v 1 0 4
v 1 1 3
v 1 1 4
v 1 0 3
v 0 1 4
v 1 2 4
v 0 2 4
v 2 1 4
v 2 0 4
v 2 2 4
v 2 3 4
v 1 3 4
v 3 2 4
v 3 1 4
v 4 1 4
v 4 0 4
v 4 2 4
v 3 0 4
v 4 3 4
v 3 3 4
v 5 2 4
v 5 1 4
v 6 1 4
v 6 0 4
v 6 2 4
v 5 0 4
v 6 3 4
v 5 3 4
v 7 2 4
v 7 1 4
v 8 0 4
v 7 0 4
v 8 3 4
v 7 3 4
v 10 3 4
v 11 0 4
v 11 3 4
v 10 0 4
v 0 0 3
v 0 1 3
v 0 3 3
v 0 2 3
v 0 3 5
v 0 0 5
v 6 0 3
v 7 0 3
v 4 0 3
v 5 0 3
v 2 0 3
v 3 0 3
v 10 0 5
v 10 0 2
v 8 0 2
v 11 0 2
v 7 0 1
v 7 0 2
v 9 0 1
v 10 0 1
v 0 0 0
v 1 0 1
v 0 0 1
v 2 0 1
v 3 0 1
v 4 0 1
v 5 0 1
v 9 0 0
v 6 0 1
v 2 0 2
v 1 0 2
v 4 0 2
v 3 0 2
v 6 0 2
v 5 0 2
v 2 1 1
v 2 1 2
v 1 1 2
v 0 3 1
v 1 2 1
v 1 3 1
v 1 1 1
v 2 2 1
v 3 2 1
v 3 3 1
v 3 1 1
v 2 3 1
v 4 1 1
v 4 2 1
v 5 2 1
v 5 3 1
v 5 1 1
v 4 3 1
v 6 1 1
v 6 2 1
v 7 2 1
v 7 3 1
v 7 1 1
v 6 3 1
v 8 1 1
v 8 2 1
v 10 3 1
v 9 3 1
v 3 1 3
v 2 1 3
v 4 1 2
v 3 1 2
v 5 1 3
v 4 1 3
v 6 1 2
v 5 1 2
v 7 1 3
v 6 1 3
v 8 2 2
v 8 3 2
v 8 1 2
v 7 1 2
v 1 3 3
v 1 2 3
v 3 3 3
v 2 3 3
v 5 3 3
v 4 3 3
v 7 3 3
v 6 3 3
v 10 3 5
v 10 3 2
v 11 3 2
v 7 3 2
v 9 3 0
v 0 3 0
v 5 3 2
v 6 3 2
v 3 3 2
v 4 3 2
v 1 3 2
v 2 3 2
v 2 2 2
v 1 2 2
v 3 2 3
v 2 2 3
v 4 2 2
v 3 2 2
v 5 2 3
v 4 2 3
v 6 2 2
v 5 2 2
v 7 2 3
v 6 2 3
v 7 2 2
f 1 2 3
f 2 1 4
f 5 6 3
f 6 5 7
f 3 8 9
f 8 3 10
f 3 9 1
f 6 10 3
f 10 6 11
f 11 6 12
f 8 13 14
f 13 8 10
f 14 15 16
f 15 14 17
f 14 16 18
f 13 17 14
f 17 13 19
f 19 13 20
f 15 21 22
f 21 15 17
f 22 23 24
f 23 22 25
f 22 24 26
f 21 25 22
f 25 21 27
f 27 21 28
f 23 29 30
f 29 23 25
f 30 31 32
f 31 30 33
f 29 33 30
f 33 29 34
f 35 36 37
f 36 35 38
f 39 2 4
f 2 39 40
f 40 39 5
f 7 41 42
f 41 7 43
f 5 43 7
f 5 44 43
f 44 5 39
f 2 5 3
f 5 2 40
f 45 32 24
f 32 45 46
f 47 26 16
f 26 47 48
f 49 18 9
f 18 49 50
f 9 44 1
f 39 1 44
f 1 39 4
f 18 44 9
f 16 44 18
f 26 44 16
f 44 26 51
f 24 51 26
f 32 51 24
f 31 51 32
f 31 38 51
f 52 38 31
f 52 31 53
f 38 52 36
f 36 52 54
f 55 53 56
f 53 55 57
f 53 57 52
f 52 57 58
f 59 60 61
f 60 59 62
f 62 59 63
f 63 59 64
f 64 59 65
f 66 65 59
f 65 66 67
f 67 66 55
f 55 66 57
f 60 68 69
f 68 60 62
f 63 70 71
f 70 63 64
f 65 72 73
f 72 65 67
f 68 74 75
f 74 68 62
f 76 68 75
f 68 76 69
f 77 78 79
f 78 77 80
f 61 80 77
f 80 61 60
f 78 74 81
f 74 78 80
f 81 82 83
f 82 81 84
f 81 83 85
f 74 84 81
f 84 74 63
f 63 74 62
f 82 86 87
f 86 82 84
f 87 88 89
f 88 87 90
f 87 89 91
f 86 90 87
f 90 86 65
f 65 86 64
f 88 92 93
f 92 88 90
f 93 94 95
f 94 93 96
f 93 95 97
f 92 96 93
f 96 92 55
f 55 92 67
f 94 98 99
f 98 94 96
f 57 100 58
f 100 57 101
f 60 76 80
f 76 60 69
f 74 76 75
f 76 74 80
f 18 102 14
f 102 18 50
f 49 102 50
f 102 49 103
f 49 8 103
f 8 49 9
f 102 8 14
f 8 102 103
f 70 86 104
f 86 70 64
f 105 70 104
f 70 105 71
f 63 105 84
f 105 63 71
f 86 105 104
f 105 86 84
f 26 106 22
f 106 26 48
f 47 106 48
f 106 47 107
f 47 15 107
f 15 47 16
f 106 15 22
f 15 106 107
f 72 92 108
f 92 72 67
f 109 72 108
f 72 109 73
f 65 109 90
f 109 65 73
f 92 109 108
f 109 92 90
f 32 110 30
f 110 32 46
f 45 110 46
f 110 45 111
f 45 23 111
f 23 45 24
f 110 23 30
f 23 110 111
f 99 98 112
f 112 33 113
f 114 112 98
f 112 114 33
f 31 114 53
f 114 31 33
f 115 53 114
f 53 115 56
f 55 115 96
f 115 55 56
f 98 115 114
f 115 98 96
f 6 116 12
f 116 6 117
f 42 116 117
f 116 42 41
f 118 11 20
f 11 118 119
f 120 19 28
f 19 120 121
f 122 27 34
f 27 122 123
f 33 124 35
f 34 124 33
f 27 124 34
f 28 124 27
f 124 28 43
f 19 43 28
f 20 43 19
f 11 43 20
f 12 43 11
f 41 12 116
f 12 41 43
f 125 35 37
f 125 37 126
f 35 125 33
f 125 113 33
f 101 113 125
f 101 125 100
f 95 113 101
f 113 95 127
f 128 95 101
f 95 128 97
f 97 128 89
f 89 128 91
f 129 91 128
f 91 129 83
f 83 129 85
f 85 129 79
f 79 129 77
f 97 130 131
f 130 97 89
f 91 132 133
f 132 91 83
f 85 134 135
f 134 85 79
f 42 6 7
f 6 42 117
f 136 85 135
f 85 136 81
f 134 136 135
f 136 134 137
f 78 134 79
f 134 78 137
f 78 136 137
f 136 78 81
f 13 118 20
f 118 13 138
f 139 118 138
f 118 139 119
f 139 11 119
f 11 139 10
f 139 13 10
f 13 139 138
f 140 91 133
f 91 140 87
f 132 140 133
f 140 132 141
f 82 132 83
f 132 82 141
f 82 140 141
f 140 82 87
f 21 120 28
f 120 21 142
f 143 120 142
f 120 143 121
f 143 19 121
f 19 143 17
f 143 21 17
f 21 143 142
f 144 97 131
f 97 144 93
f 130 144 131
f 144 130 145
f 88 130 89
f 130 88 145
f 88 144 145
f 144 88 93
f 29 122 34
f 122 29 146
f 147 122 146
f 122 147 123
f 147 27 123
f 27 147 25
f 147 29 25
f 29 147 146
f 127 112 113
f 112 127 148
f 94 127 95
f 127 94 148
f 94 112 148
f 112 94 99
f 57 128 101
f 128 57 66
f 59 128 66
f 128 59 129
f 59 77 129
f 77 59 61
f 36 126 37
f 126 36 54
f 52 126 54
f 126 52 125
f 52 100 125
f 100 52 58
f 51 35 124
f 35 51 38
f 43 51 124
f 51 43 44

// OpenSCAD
largura = 1;
distancia=1;
espessura = 3;
n=4;

module dentes(n){
	for (i=[0:n-1]){
		translate([(largura+distancia)*i, 0, 3]) cube();
		translate([(largura+distancia)*(i+0.5), 0, 1]) cube();
	}
}

cube([2*(n+0.5)*largura, espessura, largura]);
translate([largura*n*2, 0, largura*2]) cube([3*largura, espessura, 2*largura]);
translate([largura*n*2, 0, largura*1]) cube([2*largura, espessura, largura]);
translate([0, 0, largura*4]) cube([2*(n+1)*largura, espessura, largura]);

dentes(n);
translate([0, 2*largura, 0]) dentes(n);
